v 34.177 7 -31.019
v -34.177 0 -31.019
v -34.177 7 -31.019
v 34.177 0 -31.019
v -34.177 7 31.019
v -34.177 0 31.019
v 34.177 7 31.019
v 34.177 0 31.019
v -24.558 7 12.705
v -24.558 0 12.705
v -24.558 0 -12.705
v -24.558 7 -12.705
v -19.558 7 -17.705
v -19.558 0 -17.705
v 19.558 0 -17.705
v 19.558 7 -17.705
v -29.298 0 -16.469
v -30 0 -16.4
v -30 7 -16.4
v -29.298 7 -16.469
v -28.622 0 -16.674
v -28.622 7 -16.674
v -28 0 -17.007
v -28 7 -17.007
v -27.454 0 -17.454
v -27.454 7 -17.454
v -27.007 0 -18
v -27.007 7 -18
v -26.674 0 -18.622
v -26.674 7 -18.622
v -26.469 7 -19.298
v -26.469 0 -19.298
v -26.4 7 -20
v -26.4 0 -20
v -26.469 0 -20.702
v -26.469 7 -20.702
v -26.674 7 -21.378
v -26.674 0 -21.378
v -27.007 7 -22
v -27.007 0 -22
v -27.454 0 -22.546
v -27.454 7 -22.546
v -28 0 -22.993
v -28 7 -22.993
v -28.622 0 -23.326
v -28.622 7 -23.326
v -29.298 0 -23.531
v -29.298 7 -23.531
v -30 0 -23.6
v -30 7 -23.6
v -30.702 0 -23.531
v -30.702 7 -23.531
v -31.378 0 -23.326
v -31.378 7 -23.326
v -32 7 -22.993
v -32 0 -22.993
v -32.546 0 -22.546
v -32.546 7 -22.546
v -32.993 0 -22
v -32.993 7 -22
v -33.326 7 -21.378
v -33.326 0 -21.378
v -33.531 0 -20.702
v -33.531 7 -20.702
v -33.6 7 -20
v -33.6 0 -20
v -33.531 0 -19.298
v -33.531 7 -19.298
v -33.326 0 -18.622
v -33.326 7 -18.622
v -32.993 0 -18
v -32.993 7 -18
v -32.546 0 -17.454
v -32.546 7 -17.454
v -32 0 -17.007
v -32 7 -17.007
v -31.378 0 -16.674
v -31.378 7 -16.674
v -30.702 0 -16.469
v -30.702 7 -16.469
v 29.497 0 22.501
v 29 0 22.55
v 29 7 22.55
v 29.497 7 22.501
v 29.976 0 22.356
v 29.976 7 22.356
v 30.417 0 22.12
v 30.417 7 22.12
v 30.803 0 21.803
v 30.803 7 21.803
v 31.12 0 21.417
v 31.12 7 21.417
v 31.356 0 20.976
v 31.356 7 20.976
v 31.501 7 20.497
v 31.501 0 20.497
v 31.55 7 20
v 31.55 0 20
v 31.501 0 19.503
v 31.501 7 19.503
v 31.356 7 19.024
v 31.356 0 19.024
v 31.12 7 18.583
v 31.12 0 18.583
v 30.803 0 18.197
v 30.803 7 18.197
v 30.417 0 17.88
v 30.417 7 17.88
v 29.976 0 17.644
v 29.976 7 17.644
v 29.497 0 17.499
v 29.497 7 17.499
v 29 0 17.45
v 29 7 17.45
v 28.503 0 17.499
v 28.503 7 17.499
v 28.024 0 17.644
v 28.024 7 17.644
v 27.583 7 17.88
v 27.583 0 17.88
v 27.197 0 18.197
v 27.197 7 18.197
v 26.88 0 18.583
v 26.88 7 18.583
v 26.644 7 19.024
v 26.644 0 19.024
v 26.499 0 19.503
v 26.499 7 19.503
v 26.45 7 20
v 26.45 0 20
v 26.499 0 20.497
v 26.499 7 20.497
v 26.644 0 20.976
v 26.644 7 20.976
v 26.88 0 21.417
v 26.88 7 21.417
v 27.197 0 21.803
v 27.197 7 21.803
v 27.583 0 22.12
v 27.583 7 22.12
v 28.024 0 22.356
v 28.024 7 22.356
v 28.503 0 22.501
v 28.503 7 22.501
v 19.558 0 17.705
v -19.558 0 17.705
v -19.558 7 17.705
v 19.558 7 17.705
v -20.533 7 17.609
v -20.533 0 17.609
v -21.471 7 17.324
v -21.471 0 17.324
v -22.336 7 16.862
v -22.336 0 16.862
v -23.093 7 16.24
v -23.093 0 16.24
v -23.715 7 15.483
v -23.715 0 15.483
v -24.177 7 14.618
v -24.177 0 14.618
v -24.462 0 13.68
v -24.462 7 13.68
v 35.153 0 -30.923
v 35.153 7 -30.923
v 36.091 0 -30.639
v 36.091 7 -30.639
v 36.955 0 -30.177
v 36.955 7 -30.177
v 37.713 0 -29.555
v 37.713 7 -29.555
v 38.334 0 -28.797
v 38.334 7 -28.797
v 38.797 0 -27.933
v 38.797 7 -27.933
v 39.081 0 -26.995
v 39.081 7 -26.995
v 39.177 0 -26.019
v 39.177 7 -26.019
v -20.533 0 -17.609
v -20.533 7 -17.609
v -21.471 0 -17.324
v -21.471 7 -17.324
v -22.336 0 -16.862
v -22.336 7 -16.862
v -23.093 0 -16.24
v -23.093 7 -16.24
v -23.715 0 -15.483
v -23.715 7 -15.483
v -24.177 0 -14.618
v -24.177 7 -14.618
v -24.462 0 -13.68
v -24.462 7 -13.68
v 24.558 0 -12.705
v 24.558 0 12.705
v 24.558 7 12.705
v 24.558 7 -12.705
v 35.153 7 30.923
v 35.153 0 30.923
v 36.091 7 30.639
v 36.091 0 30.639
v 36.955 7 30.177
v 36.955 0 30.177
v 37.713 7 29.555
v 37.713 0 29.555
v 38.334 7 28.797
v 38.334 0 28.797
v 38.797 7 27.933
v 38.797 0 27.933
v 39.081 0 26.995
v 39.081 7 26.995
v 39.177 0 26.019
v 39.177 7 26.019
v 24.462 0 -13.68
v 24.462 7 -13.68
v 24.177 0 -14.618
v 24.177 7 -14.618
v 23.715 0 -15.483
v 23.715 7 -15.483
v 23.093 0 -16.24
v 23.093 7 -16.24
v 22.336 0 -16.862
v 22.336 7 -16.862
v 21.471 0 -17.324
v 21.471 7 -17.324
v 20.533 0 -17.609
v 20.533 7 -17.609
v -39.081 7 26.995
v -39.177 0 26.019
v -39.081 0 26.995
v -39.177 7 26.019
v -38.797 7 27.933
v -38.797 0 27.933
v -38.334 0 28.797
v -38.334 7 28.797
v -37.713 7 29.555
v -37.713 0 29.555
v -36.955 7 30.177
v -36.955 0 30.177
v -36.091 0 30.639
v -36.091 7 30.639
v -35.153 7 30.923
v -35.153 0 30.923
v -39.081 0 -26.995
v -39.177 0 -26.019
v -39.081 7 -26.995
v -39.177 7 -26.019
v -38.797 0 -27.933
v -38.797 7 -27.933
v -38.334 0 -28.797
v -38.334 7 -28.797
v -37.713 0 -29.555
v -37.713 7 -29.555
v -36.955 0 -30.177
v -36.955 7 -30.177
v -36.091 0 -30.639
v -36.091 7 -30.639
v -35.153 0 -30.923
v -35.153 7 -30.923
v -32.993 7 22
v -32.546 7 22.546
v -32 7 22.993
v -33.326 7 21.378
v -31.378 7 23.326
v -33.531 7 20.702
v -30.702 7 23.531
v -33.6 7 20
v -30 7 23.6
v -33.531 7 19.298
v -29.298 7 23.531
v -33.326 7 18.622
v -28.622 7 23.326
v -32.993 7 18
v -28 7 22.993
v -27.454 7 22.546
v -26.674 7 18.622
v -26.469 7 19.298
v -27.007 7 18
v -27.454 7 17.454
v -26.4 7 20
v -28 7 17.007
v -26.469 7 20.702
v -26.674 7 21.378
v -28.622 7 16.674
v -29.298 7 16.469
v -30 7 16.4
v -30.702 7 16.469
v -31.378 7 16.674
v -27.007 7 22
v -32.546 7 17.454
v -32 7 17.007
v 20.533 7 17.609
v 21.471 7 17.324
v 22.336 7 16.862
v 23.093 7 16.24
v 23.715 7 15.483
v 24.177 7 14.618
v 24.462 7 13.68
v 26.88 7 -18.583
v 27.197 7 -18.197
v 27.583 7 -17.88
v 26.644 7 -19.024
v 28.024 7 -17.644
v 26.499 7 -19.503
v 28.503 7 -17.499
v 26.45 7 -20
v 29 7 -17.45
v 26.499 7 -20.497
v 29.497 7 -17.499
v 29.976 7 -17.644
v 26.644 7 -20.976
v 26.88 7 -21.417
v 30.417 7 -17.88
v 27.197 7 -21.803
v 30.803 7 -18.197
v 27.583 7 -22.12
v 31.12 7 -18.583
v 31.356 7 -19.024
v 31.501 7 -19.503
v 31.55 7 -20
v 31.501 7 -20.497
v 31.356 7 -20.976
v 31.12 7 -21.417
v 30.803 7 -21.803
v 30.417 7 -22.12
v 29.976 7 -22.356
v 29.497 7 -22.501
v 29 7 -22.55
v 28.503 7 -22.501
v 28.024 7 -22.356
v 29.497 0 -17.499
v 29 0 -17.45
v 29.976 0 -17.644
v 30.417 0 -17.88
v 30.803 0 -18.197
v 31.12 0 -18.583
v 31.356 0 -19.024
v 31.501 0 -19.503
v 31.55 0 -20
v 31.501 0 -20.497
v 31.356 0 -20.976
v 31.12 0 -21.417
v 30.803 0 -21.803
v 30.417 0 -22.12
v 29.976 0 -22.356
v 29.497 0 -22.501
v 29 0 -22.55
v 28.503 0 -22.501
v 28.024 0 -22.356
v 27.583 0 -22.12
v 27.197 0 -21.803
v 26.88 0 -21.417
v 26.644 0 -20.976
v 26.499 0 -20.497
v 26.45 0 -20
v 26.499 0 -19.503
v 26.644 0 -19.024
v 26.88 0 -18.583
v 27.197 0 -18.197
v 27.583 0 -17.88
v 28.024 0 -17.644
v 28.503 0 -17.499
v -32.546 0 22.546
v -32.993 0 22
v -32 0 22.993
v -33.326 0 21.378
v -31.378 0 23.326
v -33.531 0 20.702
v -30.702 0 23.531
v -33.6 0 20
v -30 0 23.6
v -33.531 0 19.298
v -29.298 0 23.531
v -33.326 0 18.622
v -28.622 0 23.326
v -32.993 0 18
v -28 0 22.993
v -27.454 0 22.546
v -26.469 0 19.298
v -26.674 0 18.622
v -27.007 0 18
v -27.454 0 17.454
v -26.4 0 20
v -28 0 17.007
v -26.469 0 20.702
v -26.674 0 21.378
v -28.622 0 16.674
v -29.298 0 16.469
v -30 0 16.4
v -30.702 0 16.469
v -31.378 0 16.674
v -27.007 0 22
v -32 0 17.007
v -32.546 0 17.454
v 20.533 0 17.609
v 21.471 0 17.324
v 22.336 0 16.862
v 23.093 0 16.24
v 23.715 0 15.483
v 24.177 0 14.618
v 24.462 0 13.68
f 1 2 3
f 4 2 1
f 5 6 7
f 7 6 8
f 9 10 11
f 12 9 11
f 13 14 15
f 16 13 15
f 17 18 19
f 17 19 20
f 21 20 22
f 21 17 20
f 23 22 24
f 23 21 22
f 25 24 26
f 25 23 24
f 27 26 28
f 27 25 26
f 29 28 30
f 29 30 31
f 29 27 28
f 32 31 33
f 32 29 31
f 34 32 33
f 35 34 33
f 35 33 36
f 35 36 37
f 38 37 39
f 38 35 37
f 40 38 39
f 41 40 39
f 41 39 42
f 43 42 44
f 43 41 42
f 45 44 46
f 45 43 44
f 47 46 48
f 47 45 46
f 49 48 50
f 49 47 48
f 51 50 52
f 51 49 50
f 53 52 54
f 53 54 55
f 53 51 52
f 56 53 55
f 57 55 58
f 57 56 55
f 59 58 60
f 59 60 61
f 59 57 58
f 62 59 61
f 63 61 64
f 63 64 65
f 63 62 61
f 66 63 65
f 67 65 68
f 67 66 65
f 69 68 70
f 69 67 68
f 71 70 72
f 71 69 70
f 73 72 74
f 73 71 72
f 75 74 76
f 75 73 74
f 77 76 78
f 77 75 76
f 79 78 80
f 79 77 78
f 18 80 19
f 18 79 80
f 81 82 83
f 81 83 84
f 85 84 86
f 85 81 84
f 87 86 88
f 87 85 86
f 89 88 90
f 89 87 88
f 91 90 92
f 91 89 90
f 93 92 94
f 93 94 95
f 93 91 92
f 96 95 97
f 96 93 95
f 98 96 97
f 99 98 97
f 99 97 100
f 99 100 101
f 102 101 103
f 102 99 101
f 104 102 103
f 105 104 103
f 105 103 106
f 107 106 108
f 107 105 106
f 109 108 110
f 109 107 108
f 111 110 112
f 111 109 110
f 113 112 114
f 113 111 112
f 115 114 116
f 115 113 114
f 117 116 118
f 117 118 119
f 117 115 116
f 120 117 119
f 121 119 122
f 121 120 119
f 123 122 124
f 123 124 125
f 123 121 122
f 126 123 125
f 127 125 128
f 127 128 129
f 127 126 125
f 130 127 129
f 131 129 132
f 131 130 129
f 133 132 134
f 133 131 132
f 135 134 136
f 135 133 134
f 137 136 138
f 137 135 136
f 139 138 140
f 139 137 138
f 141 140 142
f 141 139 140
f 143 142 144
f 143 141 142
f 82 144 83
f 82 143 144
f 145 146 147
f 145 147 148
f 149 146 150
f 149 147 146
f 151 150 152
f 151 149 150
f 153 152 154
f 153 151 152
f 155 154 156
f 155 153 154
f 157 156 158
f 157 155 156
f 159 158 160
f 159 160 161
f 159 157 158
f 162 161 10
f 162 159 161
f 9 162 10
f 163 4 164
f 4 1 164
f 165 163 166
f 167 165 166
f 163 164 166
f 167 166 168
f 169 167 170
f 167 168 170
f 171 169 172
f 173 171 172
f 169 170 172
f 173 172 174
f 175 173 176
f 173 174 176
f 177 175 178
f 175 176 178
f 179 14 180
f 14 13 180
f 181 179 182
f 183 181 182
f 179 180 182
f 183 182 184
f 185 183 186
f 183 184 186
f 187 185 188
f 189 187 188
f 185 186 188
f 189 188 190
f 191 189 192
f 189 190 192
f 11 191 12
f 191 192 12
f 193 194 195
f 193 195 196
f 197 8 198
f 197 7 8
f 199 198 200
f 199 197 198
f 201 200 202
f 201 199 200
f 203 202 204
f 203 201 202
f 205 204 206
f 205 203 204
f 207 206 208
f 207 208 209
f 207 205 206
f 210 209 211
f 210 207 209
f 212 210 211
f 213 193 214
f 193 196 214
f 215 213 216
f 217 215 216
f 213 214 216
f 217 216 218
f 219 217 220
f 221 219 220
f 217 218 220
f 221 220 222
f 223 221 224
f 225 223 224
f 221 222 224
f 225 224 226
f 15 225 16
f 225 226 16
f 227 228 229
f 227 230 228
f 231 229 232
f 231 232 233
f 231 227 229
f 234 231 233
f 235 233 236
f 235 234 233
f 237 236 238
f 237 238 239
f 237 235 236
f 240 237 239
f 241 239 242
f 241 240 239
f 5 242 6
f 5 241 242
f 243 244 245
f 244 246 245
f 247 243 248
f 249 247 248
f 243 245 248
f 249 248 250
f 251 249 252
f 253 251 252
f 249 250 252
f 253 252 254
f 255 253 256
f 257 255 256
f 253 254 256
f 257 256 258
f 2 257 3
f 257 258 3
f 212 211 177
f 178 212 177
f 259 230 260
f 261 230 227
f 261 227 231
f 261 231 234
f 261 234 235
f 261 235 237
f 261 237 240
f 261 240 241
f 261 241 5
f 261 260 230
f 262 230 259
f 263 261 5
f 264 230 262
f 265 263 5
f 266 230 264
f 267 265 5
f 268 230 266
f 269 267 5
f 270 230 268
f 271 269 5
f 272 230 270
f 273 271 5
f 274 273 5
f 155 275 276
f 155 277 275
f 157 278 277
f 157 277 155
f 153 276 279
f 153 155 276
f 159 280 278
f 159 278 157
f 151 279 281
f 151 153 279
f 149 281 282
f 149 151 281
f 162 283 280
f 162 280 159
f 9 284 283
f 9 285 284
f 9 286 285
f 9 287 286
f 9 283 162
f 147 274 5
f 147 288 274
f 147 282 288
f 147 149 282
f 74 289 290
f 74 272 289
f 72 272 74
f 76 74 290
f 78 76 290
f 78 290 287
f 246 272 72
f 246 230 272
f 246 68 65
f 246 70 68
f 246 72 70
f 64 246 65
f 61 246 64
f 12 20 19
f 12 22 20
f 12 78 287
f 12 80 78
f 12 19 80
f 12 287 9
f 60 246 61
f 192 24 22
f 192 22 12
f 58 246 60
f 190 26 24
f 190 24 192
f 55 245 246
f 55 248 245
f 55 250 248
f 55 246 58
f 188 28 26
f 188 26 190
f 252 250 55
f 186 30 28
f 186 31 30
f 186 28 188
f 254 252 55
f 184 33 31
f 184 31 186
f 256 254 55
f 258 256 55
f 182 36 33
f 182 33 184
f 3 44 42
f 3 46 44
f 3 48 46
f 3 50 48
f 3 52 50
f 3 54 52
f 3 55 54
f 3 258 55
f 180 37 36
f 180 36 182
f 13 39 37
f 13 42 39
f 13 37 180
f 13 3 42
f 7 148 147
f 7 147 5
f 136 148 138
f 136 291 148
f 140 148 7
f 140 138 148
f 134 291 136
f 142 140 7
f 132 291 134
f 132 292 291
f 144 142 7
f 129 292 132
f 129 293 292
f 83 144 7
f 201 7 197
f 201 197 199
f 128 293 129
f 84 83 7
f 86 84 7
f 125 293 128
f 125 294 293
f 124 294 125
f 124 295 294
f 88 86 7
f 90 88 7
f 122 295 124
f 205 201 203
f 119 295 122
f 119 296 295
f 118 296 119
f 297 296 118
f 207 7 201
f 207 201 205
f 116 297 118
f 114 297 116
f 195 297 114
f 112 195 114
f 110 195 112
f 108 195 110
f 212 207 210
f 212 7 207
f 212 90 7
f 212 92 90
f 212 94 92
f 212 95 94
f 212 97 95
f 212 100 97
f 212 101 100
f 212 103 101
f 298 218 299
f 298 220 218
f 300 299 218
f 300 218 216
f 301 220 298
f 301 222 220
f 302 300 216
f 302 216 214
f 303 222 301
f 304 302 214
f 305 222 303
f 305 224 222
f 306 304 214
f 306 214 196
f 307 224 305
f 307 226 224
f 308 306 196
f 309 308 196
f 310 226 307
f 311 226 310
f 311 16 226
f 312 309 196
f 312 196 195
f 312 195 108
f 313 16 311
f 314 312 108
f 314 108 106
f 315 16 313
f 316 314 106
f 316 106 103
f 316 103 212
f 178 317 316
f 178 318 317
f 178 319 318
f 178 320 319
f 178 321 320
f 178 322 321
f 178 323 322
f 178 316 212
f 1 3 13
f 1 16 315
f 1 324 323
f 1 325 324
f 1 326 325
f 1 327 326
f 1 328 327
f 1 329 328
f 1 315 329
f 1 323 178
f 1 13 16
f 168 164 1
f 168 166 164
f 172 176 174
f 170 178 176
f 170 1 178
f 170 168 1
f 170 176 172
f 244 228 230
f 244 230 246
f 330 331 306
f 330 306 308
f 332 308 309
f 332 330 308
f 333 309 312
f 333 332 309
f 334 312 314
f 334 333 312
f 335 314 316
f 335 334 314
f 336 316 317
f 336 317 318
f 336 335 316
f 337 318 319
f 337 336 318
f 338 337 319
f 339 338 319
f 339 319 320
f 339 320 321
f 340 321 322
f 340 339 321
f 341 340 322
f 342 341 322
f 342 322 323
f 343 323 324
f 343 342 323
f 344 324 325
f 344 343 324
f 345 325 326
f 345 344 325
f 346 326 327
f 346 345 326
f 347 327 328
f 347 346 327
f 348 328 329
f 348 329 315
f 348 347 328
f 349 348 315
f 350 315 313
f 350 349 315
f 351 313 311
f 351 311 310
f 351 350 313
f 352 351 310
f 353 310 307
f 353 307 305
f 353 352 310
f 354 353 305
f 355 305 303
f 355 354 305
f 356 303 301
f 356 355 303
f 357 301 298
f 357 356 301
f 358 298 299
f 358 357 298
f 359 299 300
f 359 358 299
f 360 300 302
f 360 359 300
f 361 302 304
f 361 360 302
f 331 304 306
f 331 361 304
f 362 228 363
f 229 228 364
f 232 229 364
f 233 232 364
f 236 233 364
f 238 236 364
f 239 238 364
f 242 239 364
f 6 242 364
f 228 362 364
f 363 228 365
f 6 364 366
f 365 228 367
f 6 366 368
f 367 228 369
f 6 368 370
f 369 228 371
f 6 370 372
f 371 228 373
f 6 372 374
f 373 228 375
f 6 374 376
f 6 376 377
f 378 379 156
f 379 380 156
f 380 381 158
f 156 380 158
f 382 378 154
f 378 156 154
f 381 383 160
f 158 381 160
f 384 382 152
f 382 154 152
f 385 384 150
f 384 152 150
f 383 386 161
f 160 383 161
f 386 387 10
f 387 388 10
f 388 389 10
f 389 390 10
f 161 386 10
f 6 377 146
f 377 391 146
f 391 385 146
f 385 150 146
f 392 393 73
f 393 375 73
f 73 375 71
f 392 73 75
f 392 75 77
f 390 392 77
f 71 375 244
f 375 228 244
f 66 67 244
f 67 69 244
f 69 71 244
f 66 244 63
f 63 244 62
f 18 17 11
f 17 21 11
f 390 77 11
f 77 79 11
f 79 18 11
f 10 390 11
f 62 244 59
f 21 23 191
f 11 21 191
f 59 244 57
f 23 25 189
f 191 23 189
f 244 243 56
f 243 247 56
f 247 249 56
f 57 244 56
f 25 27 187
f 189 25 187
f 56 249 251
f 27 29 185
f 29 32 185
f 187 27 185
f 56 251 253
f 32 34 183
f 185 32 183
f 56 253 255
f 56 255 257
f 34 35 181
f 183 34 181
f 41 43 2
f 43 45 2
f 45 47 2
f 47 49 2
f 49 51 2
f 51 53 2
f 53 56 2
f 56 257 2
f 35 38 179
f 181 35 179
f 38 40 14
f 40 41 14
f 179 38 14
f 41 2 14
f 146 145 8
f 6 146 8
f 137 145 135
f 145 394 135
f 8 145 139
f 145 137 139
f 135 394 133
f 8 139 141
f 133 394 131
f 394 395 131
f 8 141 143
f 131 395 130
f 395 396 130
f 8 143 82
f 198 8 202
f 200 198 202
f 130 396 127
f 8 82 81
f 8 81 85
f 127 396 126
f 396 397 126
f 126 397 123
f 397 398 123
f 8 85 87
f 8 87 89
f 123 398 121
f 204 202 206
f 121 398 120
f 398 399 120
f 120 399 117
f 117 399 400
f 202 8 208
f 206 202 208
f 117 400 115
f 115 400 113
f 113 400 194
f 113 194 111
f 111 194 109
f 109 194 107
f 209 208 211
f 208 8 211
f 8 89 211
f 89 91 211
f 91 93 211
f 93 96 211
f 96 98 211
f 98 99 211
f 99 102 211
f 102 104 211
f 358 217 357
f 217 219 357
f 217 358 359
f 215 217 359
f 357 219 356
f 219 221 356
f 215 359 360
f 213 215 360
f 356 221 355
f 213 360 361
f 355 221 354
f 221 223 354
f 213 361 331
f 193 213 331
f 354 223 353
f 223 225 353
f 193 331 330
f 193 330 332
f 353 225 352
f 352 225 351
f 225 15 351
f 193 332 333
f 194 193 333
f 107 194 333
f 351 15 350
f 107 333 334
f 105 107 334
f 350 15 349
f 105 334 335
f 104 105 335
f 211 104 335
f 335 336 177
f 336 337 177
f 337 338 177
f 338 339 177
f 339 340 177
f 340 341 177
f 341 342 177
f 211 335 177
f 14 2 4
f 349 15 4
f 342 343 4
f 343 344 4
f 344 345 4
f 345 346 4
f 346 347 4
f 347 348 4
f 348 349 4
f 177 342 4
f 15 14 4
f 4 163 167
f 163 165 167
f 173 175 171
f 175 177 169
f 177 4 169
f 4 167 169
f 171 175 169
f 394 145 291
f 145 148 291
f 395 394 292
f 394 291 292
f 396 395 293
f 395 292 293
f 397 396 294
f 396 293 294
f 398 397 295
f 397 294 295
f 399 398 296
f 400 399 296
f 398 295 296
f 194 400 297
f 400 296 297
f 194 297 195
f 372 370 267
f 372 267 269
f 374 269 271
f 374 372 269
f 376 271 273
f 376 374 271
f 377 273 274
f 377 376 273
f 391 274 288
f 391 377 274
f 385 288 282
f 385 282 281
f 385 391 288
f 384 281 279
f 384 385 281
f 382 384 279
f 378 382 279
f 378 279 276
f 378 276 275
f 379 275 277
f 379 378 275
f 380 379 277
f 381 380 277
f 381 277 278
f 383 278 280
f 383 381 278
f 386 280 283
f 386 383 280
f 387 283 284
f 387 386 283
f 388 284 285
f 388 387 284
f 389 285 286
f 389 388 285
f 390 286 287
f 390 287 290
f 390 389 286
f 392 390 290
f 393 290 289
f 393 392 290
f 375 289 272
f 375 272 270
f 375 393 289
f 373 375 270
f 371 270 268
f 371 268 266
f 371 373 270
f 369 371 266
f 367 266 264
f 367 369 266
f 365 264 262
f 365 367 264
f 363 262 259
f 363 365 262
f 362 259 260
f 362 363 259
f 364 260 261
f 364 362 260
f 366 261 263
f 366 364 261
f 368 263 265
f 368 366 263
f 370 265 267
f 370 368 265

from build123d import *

# Parameters (mm, degrees)
SKETCH1_W           = 78.3542787
SKETCH1_H           = 62.038678242
SKETCH1_R           = 2.55
SKETCH1_R_2         = 3.6
SKETCH1_W_2         = 49.11576042
SKETCH1_H_2         = 35.409761762
BOSS_EXTRUDE1_DEPTH = 7
FILLET2_R           = 5


with BuildPart() as part:
    # Sketch1 → Boss-Extrude1 (new body)
    with BuildSketch(Plane(origin=(0, 0, 0), x_dir=(1, 0, 0), z_dir=(0, 1, 0))):
        Rectangle(SKETCH1_W, SKETCH1_H)
        with Locations(Location((29, 20, 0), (0, 0, 270))):
            Circle(SKETCH1_R, mode=Mode.SUBTRACT)
        with Locations(Location((29, -20, 0), (0, 0, 270))):
            Circle(SKETCH1_R, mode=Mode.SUBTRACT)
        with Locations(Location((-30, -20, 0), (0, 0, 270))):
            Circle(SKETCH1_R_2, mode=Mode.SUBTRACT)
        with Locations(Location((-30, 20, 0), (0, 0, 270))):
            Circle(SKETCH1_R_2, mode=Mode.SUBTRACT)
        Rectangle(SKETCH1_W_2, SKETCH1_H_2, mode=Mode.SUBTRACT)
    extrude(amount=BOSS_EXTRUDE1_DEPTH)

    # Fillet2
    fillet2_edges = [part.edges().sort_by_distance(p)[0] for p in [
        (24.55788021, 3.5, 17.704880881),
        (24.55788021, 3.5, -17.704880881),
        (-24.55788021, 3.5, -17.704880881),
        (-24.55788021, 3.5, 17.704880881),
        (39.17713935, 3.5, 31.019339121),
        (-39.17713935, 3.5, 31.019339121),
        (-39.17713935, 3.5, -31.019339121),
        (39.17713935, 3.5, -31.019339121),
    ]]
    fillet(fillet2_edges, radius=FILLET2_R)


solid = part.part
